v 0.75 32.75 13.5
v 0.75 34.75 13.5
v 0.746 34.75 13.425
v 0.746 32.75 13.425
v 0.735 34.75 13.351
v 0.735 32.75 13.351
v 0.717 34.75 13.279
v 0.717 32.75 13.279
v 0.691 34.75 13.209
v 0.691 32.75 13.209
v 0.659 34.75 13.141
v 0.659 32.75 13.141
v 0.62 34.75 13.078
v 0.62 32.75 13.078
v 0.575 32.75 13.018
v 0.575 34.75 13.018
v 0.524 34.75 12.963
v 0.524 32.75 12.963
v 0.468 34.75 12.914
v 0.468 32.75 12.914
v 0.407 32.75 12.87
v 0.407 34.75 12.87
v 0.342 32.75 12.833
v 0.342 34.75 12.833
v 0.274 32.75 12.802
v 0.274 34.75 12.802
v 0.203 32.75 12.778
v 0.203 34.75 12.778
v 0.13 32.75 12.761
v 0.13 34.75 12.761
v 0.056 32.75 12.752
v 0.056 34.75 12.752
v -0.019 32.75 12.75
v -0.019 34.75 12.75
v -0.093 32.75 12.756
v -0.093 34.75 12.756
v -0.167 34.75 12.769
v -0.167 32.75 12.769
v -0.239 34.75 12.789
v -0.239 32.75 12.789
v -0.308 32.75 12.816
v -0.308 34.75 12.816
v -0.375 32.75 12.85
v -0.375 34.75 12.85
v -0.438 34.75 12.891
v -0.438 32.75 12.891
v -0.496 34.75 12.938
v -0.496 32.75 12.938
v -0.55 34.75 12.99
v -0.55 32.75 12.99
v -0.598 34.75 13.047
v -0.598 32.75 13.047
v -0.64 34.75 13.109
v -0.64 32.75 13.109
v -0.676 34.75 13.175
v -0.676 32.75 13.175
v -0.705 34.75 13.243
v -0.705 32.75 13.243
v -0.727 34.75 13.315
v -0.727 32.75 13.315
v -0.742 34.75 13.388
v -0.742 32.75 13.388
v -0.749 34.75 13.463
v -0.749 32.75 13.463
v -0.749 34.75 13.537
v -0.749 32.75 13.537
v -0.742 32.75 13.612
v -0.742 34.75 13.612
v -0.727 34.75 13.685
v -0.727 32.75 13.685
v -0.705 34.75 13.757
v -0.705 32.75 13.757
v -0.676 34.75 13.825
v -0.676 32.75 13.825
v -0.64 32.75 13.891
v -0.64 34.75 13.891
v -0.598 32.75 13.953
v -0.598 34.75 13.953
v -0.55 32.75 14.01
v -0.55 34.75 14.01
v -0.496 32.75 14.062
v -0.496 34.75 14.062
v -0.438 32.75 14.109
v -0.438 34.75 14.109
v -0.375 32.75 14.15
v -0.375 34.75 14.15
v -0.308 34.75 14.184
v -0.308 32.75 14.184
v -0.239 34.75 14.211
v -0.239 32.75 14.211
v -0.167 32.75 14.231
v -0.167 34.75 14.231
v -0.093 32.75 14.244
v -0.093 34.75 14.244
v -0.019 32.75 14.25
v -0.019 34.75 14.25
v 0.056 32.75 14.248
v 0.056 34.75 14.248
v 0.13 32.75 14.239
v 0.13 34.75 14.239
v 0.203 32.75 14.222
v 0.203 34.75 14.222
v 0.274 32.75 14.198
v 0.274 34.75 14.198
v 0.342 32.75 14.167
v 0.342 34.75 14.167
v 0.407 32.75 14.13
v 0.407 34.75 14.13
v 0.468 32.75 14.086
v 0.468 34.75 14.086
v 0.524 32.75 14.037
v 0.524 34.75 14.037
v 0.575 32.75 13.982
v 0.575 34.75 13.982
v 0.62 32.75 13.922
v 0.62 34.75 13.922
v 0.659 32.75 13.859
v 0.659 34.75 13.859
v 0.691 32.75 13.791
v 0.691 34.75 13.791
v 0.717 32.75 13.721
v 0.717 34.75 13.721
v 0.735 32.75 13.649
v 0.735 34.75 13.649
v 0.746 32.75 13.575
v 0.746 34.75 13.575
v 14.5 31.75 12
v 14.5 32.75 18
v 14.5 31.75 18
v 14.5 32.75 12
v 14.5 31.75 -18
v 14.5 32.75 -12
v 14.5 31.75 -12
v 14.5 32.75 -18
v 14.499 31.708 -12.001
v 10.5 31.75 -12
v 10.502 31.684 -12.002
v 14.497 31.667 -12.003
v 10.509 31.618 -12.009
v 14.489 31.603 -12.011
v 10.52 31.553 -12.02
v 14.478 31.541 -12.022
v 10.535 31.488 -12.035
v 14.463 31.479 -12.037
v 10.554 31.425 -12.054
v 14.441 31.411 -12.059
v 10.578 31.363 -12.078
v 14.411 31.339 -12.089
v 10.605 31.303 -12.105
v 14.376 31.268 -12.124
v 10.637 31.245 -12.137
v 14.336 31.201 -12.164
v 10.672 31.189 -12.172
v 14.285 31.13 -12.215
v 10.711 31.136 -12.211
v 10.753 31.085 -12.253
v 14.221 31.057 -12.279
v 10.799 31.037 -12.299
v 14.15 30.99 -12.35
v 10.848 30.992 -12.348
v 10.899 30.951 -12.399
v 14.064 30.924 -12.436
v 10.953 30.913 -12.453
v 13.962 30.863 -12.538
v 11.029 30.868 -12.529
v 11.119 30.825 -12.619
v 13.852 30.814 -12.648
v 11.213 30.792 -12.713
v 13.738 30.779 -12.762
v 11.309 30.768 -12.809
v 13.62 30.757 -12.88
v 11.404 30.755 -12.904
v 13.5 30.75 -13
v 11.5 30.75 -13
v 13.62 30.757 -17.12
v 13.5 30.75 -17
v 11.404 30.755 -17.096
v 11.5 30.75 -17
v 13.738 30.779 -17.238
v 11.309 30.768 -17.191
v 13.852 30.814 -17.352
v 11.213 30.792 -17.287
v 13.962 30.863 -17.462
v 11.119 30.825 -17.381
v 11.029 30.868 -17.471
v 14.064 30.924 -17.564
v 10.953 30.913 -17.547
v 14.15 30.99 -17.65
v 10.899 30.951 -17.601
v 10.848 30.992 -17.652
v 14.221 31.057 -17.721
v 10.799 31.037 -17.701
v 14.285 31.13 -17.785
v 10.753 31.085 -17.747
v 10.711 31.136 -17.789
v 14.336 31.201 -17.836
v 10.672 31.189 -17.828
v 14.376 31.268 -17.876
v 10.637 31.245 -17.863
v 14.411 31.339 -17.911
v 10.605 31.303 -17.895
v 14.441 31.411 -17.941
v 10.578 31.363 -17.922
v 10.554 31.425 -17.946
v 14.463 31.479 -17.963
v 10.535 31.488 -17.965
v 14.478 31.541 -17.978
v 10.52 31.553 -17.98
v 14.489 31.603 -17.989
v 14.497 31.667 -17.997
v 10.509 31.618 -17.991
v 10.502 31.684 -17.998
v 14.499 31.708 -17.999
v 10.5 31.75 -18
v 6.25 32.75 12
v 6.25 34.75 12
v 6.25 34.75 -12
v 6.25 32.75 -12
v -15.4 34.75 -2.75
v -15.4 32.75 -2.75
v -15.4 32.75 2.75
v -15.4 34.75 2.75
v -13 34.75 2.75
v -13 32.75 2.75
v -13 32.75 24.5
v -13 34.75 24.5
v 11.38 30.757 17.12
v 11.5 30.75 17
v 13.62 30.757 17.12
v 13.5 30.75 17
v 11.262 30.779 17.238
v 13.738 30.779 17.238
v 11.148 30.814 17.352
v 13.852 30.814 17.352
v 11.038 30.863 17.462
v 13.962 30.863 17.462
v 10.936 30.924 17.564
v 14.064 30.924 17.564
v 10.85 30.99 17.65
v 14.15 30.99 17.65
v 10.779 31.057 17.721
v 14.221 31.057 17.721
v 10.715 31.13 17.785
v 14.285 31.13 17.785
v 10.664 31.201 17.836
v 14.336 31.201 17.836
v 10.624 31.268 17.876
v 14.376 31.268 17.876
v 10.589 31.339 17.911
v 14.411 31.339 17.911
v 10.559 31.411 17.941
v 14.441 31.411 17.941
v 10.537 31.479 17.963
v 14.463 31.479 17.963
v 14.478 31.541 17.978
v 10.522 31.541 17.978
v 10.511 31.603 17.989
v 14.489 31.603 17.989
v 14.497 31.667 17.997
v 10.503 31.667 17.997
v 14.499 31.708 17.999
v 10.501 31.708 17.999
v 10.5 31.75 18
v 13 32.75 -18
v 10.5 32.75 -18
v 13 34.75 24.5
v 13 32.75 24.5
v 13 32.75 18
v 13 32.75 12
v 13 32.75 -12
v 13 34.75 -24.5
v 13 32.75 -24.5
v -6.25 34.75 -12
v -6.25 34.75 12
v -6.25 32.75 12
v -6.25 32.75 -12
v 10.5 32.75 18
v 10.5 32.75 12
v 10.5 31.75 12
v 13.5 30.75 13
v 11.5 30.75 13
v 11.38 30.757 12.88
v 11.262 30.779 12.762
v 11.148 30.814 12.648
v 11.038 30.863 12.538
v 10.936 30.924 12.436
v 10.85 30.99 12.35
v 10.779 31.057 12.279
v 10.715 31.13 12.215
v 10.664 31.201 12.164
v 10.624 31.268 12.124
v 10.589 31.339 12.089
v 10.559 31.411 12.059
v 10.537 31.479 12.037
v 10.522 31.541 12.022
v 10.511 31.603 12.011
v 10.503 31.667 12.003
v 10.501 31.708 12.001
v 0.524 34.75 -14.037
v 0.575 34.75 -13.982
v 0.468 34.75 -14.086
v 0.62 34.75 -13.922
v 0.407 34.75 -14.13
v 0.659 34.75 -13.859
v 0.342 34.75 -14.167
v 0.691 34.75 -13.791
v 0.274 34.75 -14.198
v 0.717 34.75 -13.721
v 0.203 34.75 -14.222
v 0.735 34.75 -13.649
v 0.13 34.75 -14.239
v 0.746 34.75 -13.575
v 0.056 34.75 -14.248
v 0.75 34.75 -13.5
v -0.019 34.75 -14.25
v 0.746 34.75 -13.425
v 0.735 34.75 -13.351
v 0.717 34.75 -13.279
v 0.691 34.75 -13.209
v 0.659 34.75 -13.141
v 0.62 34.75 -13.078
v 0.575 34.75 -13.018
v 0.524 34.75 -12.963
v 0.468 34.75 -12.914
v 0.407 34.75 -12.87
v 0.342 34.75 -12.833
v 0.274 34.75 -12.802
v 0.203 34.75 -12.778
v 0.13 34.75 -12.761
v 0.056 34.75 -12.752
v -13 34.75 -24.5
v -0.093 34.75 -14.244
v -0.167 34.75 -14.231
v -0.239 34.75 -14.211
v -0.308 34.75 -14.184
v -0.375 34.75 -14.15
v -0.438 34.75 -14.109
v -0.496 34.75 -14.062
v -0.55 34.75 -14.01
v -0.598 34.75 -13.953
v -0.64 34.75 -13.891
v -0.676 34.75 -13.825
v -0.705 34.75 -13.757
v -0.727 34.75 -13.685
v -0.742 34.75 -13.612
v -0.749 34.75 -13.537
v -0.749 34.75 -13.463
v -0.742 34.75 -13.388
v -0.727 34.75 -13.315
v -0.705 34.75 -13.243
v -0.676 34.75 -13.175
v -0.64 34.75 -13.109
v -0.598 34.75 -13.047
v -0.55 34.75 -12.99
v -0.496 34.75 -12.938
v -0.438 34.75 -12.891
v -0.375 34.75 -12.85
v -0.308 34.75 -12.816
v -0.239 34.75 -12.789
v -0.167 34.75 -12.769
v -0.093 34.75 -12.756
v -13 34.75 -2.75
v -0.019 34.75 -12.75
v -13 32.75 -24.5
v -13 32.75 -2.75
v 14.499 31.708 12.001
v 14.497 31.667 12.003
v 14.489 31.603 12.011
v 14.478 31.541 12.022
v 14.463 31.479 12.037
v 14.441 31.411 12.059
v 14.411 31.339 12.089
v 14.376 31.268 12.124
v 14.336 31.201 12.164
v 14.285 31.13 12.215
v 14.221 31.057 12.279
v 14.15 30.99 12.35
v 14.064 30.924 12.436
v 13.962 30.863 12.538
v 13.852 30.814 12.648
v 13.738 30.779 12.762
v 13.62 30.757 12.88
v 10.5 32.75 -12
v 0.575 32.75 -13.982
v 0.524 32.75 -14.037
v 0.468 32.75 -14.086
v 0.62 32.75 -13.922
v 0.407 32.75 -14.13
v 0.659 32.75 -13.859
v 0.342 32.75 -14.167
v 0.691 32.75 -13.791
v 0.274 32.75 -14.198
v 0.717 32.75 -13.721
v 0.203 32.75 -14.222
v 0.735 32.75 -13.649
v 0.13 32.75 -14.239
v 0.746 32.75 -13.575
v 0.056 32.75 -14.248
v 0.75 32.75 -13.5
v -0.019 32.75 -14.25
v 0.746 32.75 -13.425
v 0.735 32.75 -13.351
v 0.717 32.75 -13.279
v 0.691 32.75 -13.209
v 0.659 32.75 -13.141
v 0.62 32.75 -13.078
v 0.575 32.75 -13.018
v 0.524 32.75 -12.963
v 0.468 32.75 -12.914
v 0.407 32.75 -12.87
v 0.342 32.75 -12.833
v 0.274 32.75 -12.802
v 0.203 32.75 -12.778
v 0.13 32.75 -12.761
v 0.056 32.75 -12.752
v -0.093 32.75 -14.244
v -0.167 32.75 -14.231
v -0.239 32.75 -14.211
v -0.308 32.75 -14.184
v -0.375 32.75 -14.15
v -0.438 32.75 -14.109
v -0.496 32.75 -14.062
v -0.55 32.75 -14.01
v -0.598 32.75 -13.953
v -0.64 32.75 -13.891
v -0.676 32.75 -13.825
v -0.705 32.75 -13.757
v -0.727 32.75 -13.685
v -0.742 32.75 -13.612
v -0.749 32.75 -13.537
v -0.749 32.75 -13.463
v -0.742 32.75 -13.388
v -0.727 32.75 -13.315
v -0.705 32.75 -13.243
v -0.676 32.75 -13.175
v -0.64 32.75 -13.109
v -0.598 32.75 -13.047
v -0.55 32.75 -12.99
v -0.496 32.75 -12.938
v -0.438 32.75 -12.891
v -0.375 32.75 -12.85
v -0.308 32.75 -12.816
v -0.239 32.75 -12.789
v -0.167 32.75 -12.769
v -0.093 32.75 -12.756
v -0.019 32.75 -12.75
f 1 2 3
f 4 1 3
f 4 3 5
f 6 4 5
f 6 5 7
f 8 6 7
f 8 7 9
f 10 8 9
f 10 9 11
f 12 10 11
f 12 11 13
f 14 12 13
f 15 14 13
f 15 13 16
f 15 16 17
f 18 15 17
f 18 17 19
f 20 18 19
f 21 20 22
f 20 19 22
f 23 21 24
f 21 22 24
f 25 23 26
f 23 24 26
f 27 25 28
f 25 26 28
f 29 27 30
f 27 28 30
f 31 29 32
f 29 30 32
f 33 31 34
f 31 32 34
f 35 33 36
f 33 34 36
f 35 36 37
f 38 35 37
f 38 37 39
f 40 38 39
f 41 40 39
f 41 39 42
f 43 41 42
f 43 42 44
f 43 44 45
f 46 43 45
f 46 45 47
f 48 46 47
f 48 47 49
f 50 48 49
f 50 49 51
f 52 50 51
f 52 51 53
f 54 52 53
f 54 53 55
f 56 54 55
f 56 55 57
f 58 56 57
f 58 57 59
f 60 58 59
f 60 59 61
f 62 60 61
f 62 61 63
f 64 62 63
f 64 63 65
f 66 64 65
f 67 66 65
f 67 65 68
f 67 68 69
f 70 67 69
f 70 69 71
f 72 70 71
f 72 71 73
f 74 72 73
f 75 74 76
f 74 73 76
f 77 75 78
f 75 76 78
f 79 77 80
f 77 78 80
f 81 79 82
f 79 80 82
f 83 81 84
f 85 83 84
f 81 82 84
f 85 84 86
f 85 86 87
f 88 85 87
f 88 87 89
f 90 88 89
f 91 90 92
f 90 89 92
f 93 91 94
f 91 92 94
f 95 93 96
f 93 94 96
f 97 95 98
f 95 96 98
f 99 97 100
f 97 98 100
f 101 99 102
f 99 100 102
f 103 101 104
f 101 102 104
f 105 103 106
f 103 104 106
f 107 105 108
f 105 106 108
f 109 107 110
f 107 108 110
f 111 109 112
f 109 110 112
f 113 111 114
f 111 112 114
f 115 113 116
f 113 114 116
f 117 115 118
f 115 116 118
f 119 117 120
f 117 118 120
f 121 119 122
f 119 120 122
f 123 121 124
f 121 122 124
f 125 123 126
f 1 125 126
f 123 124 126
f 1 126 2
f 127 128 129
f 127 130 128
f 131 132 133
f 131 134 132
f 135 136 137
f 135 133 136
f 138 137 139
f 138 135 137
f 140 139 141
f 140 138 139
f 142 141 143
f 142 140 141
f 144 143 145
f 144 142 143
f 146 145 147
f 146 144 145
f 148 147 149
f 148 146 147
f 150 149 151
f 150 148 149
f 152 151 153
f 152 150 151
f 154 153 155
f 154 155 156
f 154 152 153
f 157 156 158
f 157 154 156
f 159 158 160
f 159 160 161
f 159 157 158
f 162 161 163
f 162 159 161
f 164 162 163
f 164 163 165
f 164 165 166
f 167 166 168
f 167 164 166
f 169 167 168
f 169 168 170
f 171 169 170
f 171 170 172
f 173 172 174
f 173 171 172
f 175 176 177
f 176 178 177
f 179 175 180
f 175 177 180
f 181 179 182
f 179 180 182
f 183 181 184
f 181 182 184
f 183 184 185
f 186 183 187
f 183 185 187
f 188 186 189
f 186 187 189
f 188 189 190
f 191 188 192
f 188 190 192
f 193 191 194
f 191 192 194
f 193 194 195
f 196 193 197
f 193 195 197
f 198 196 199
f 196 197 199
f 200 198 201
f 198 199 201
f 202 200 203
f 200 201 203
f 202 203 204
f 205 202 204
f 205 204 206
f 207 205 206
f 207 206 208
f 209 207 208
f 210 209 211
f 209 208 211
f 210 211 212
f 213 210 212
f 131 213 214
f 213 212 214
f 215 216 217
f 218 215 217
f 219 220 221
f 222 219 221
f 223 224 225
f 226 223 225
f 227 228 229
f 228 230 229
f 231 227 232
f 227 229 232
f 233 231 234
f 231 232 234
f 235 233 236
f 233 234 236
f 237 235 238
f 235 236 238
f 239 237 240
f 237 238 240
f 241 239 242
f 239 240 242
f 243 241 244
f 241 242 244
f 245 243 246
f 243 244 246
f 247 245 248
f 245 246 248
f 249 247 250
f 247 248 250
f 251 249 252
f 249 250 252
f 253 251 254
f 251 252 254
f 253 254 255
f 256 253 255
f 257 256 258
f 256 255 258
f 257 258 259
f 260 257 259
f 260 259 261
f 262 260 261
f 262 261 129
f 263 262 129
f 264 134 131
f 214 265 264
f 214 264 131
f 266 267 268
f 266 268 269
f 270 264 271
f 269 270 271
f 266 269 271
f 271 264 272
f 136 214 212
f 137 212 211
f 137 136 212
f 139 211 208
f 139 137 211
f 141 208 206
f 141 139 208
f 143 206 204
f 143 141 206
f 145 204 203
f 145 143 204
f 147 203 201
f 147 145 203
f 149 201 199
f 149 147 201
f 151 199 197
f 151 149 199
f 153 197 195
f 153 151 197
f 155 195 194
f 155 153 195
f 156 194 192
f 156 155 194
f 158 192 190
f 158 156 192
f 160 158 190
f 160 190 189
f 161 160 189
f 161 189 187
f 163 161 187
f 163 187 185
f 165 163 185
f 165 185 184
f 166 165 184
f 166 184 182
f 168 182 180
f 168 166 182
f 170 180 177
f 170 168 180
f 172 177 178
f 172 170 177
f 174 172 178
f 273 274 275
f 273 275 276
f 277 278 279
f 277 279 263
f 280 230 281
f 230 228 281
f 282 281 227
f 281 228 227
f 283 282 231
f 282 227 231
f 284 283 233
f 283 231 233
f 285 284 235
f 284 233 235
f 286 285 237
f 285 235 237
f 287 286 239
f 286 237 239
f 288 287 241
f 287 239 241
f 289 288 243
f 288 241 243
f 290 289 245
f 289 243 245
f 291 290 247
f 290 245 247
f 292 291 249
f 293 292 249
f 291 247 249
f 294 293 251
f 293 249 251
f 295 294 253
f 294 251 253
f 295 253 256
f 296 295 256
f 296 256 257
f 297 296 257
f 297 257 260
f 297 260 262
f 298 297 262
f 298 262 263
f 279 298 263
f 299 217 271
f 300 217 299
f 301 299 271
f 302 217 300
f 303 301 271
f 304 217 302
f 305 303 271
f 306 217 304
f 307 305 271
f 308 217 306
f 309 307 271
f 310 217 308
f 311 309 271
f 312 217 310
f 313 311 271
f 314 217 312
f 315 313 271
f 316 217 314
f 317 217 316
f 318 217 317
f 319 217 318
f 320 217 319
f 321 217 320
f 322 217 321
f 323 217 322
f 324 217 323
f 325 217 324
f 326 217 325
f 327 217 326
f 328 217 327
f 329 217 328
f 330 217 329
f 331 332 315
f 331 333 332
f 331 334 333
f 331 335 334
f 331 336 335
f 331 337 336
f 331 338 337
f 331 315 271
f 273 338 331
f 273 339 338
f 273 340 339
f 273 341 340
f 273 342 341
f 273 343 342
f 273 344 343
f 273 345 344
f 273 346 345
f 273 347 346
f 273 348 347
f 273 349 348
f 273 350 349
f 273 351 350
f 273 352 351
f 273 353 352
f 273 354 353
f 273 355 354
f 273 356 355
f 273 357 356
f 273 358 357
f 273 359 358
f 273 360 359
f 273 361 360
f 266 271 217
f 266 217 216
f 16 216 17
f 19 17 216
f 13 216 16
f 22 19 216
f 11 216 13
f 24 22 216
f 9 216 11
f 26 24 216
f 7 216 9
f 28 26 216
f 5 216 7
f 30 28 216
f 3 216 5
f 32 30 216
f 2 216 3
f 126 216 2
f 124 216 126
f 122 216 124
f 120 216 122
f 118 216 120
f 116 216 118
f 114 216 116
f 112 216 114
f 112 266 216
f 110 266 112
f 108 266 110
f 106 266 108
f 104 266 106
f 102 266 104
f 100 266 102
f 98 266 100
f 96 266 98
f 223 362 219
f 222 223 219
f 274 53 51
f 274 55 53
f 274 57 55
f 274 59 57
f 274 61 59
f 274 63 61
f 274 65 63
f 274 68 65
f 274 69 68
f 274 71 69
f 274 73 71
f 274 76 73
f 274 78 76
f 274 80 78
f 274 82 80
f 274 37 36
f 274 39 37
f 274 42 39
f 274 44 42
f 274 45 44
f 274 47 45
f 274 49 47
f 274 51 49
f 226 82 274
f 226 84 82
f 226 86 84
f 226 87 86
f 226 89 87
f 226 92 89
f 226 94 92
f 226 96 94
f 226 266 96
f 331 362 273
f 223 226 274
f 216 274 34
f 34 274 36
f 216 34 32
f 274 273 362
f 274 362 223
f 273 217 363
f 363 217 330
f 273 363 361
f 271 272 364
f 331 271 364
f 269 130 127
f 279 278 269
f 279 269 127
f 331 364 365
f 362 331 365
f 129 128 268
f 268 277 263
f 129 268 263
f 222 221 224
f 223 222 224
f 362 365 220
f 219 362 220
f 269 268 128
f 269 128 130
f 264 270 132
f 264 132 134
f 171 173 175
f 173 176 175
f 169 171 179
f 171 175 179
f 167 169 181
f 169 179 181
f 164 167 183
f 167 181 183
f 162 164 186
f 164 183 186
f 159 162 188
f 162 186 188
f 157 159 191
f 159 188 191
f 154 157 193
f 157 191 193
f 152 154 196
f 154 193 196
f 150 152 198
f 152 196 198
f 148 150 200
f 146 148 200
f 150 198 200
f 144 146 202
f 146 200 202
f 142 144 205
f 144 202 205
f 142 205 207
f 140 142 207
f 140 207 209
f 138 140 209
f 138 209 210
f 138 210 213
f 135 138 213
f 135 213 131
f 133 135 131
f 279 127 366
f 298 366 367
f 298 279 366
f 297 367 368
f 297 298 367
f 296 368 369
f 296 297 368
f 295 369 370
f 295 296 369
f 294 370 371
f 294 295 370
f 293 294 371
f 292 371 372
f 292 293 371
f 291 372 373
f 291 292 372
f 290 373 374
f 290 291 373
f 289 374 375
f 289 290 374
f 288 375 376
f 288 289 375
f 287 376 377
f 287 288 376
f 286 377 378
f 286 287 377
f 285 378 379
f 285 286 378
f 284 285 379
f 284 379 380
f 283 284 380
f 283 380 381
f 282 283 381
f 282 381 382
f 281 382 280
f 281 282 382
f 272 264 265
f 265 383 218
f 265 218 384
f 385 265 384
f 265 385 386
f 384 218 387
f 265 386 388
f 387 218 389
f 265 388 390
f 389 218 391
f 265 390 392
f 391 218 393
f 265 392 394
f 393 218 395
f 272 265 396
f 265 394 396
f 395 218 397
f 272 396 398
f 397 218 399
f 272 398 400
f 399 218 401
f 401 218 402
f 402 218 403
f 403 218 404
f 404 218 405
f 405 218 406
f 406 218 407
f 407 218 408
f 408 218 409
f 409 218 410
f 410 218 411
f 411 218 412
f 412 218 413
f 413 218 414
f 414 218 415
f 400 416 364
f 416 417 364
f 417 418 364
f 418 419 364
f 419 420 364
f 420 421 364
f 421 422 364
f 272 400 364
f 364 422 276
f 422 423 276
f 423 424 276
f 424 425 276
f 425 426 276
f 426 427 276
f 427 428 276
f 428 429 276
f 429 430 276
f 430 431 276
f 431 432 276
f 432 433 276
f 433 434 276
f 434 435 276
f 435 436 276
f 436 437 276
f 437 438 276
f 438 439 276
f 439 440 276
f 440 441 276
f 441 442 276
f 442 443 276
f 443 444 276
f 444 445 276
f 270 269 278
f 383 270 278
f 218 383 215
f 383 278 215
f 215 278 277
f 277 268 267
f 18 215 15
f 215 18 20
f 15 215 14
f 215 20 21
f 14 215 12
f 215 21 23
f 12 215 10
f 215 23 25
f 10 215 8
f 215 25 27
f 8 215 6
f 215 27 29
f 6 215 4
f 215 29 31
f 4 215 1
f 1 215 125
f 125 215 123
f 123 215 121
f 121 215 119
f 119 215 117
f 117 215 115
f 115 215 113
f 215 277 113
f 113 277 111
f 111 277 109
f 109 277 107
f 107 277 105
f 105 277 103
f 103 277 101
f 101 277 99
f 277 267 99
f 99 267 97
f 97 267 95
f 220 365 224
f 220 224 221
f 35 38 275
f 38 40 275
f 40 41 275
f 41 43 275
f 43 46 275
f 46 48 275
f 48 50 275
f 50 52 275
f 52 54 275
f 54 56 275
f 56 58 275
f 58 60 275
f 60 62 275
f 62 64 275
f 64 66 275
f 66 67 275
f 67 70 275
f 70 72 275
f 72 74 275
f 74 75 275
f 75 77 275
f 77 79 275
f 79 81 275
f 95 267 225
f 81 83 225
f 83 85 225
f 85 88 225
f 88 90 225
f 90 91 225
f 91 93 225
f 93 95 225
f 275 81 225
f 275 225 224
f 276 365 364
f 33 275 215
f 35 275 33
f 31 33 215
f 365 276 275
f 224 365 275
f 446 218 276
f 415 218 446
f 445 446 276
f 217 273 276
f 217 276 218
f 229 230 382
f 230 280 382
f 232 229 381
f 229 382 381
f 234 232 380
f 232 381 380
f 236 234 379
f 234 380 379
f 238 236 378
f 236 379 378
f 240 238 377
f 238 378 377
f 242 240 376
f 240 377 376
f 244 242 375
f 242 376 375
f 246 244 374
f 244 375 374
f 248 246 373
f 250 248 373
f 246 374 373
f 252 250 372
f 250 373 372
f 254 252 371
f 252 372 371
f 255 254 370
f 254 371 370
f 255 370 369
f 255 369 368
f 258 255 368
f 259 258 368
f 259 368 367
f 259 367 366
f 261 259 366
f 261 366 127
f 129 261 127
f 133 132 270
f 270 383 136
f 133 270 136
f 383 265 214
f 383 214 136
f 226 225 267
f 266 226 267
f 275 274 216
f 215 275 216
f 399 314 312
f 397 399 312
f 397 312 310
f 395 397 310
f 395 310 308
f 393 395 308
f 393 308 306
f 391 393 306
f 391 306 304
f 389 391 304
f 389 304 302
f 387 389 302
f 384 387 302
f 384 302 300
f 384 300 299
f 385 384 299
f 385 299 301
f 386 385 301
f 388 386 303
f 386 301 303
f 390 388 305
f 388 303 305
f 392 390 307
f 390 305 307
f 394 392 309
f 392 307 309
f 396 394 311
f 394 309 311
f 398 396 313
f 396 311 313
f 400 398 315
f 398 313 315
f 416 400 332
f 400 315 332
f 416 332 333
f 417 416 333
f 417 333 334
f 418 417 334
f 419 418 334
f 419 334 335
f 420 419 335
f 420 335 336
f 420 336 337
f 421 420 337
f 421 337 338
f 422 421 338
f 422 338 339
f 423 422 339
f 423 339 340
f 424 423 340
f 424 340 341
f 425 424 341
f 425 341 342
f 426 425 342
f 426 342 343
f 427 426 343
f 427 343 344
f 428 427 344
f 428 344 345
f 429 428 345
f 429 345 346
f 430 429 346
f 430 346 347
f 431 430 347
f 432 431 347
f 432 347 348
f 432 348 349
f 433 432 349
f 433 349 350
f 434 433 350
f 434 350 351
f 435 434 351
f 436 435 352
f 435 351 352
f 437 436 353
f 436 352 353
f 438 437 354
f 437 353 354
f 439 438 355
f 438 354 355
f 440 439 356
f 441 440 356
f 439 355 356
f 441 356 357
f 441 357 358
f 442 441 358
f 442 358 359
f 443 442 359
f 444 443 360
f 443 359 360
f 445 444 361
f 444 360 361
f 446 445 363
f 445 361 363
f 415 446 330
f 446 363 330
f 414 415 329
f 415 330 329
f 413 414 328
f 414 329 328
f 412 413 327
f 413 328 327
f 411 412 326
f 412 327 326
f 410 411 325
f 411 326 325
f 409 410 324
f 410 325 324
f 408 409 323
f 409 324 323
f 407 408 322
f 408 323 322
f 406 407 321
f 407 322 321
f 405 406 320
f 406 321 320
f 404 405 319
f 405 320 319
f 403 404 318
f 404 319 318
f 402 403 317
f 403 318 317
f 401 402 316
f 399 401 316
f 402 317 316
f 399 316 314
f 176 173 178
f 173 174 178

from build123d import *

# Parameters (mm, degrees)
PAD005_DEPTH    = 2
SKETCH011_W     = 2
SKETCH011_H     = 6
PAD006_DEPTH    = 2
PAD006_FACE12_W = 2
PAD006_FACE12_H = 6
PAD007_DEPTH    = 2
PAD007_FACE15_W = 2
PAD007_FACE15_H = 6
PAD008_DEPTH    = 2
FILLET_R        = 1
SKETCH012_R     = 0.75
SKETCH012_W     = 12.5
SKETCH012_H     = 24
POCKET004_DEPTH = 5


with BuildPart() as part:
    # Sketch009 → Pad005 (new body)
    with BuildSketch(Plane(origin=(0, 32.75, 0), x_dir=(-1, 0, 0), z_dir=(0, 1, 0))):
        Polygon((13, 24.5), (-13, 24.5), (-13, -24.5), (13, -24.5), (13, -2.75), (15.4, -2.75), (15.4, 2.75), (13, 2.75), align=None)
    extrude(amount=PAD005_DEPTH)

    # Sketch011 (on Face9 of Pad005) → Pad006 (join)
    with BuildSketch(Plane.XZ.offset(-32.75)):
        with Locations((11.5, 15)):
            Rectangle(SKETCH011_W, SKETCH011_H)
        with Locations((11.5, -15)):
            Rectangle(SKETCH011_W, SKETCH011_H)
    extrude(amount=PAD006_DEPTH)

    # Pad006 Face12 → Pad007 (add)
    with BuildSketch(Plane(origin=(12.5, 31.75, 15), x_dir=(0, -1, 0), z_dir=(1, 0, 0))):
        Rectangle(PAD006_FACE12_W, PAD006_FACE12_H)
    extrude(amount=PAD007_DEPTH)

    # Pad007 Face15 → Pad008 (add)
    with BuildSketch(Plane(origin=(12.5, 31.75, -15), x_dir=(0, -1, 0), z_dir=(1, 0, 0))):
        Rectangle(PAD007_FACE15_W, PAD007_FACE15_H)
    extrude(amount=PAD008_DEPTH)

    # Fillet
    fillet_edges = [part.edges().sort_by_distance(p)[0] for p in [
        (14.5, 30.75, -15),
        (14.5, 30.75, 15),
        (10.5, 30.75, 15),
        (10.5, 30.75, -15),
        (12.5, 30.75, 18),
        (12.5, 30.75, 12),
        (12.5, 30.75, -12),
        (12.5, 30.75, -18),
    ]]
    fillet(fillet_edges, radius=FILLET_R)

    # Sketch012 (on Face23 of Fillet) → Pocket004 (cut)
    with BuildSketch(Plane(origin=(0, 34.75, 0), x_dir=(1, 0, 0), z_dir=(0, 1, 0))):
        with Locations((0, 13.5)):
            Circle(SKETCH012_R)
        with Locations((0, -13.5)):
            Circle(SKETCH012_R)
        Rectangle(SKETCH012_W, SKETCH012_H)
    extrude(amount=-POCKET004_DEPTH, mode=Mode.SUBTRACT)


solid = part.part
